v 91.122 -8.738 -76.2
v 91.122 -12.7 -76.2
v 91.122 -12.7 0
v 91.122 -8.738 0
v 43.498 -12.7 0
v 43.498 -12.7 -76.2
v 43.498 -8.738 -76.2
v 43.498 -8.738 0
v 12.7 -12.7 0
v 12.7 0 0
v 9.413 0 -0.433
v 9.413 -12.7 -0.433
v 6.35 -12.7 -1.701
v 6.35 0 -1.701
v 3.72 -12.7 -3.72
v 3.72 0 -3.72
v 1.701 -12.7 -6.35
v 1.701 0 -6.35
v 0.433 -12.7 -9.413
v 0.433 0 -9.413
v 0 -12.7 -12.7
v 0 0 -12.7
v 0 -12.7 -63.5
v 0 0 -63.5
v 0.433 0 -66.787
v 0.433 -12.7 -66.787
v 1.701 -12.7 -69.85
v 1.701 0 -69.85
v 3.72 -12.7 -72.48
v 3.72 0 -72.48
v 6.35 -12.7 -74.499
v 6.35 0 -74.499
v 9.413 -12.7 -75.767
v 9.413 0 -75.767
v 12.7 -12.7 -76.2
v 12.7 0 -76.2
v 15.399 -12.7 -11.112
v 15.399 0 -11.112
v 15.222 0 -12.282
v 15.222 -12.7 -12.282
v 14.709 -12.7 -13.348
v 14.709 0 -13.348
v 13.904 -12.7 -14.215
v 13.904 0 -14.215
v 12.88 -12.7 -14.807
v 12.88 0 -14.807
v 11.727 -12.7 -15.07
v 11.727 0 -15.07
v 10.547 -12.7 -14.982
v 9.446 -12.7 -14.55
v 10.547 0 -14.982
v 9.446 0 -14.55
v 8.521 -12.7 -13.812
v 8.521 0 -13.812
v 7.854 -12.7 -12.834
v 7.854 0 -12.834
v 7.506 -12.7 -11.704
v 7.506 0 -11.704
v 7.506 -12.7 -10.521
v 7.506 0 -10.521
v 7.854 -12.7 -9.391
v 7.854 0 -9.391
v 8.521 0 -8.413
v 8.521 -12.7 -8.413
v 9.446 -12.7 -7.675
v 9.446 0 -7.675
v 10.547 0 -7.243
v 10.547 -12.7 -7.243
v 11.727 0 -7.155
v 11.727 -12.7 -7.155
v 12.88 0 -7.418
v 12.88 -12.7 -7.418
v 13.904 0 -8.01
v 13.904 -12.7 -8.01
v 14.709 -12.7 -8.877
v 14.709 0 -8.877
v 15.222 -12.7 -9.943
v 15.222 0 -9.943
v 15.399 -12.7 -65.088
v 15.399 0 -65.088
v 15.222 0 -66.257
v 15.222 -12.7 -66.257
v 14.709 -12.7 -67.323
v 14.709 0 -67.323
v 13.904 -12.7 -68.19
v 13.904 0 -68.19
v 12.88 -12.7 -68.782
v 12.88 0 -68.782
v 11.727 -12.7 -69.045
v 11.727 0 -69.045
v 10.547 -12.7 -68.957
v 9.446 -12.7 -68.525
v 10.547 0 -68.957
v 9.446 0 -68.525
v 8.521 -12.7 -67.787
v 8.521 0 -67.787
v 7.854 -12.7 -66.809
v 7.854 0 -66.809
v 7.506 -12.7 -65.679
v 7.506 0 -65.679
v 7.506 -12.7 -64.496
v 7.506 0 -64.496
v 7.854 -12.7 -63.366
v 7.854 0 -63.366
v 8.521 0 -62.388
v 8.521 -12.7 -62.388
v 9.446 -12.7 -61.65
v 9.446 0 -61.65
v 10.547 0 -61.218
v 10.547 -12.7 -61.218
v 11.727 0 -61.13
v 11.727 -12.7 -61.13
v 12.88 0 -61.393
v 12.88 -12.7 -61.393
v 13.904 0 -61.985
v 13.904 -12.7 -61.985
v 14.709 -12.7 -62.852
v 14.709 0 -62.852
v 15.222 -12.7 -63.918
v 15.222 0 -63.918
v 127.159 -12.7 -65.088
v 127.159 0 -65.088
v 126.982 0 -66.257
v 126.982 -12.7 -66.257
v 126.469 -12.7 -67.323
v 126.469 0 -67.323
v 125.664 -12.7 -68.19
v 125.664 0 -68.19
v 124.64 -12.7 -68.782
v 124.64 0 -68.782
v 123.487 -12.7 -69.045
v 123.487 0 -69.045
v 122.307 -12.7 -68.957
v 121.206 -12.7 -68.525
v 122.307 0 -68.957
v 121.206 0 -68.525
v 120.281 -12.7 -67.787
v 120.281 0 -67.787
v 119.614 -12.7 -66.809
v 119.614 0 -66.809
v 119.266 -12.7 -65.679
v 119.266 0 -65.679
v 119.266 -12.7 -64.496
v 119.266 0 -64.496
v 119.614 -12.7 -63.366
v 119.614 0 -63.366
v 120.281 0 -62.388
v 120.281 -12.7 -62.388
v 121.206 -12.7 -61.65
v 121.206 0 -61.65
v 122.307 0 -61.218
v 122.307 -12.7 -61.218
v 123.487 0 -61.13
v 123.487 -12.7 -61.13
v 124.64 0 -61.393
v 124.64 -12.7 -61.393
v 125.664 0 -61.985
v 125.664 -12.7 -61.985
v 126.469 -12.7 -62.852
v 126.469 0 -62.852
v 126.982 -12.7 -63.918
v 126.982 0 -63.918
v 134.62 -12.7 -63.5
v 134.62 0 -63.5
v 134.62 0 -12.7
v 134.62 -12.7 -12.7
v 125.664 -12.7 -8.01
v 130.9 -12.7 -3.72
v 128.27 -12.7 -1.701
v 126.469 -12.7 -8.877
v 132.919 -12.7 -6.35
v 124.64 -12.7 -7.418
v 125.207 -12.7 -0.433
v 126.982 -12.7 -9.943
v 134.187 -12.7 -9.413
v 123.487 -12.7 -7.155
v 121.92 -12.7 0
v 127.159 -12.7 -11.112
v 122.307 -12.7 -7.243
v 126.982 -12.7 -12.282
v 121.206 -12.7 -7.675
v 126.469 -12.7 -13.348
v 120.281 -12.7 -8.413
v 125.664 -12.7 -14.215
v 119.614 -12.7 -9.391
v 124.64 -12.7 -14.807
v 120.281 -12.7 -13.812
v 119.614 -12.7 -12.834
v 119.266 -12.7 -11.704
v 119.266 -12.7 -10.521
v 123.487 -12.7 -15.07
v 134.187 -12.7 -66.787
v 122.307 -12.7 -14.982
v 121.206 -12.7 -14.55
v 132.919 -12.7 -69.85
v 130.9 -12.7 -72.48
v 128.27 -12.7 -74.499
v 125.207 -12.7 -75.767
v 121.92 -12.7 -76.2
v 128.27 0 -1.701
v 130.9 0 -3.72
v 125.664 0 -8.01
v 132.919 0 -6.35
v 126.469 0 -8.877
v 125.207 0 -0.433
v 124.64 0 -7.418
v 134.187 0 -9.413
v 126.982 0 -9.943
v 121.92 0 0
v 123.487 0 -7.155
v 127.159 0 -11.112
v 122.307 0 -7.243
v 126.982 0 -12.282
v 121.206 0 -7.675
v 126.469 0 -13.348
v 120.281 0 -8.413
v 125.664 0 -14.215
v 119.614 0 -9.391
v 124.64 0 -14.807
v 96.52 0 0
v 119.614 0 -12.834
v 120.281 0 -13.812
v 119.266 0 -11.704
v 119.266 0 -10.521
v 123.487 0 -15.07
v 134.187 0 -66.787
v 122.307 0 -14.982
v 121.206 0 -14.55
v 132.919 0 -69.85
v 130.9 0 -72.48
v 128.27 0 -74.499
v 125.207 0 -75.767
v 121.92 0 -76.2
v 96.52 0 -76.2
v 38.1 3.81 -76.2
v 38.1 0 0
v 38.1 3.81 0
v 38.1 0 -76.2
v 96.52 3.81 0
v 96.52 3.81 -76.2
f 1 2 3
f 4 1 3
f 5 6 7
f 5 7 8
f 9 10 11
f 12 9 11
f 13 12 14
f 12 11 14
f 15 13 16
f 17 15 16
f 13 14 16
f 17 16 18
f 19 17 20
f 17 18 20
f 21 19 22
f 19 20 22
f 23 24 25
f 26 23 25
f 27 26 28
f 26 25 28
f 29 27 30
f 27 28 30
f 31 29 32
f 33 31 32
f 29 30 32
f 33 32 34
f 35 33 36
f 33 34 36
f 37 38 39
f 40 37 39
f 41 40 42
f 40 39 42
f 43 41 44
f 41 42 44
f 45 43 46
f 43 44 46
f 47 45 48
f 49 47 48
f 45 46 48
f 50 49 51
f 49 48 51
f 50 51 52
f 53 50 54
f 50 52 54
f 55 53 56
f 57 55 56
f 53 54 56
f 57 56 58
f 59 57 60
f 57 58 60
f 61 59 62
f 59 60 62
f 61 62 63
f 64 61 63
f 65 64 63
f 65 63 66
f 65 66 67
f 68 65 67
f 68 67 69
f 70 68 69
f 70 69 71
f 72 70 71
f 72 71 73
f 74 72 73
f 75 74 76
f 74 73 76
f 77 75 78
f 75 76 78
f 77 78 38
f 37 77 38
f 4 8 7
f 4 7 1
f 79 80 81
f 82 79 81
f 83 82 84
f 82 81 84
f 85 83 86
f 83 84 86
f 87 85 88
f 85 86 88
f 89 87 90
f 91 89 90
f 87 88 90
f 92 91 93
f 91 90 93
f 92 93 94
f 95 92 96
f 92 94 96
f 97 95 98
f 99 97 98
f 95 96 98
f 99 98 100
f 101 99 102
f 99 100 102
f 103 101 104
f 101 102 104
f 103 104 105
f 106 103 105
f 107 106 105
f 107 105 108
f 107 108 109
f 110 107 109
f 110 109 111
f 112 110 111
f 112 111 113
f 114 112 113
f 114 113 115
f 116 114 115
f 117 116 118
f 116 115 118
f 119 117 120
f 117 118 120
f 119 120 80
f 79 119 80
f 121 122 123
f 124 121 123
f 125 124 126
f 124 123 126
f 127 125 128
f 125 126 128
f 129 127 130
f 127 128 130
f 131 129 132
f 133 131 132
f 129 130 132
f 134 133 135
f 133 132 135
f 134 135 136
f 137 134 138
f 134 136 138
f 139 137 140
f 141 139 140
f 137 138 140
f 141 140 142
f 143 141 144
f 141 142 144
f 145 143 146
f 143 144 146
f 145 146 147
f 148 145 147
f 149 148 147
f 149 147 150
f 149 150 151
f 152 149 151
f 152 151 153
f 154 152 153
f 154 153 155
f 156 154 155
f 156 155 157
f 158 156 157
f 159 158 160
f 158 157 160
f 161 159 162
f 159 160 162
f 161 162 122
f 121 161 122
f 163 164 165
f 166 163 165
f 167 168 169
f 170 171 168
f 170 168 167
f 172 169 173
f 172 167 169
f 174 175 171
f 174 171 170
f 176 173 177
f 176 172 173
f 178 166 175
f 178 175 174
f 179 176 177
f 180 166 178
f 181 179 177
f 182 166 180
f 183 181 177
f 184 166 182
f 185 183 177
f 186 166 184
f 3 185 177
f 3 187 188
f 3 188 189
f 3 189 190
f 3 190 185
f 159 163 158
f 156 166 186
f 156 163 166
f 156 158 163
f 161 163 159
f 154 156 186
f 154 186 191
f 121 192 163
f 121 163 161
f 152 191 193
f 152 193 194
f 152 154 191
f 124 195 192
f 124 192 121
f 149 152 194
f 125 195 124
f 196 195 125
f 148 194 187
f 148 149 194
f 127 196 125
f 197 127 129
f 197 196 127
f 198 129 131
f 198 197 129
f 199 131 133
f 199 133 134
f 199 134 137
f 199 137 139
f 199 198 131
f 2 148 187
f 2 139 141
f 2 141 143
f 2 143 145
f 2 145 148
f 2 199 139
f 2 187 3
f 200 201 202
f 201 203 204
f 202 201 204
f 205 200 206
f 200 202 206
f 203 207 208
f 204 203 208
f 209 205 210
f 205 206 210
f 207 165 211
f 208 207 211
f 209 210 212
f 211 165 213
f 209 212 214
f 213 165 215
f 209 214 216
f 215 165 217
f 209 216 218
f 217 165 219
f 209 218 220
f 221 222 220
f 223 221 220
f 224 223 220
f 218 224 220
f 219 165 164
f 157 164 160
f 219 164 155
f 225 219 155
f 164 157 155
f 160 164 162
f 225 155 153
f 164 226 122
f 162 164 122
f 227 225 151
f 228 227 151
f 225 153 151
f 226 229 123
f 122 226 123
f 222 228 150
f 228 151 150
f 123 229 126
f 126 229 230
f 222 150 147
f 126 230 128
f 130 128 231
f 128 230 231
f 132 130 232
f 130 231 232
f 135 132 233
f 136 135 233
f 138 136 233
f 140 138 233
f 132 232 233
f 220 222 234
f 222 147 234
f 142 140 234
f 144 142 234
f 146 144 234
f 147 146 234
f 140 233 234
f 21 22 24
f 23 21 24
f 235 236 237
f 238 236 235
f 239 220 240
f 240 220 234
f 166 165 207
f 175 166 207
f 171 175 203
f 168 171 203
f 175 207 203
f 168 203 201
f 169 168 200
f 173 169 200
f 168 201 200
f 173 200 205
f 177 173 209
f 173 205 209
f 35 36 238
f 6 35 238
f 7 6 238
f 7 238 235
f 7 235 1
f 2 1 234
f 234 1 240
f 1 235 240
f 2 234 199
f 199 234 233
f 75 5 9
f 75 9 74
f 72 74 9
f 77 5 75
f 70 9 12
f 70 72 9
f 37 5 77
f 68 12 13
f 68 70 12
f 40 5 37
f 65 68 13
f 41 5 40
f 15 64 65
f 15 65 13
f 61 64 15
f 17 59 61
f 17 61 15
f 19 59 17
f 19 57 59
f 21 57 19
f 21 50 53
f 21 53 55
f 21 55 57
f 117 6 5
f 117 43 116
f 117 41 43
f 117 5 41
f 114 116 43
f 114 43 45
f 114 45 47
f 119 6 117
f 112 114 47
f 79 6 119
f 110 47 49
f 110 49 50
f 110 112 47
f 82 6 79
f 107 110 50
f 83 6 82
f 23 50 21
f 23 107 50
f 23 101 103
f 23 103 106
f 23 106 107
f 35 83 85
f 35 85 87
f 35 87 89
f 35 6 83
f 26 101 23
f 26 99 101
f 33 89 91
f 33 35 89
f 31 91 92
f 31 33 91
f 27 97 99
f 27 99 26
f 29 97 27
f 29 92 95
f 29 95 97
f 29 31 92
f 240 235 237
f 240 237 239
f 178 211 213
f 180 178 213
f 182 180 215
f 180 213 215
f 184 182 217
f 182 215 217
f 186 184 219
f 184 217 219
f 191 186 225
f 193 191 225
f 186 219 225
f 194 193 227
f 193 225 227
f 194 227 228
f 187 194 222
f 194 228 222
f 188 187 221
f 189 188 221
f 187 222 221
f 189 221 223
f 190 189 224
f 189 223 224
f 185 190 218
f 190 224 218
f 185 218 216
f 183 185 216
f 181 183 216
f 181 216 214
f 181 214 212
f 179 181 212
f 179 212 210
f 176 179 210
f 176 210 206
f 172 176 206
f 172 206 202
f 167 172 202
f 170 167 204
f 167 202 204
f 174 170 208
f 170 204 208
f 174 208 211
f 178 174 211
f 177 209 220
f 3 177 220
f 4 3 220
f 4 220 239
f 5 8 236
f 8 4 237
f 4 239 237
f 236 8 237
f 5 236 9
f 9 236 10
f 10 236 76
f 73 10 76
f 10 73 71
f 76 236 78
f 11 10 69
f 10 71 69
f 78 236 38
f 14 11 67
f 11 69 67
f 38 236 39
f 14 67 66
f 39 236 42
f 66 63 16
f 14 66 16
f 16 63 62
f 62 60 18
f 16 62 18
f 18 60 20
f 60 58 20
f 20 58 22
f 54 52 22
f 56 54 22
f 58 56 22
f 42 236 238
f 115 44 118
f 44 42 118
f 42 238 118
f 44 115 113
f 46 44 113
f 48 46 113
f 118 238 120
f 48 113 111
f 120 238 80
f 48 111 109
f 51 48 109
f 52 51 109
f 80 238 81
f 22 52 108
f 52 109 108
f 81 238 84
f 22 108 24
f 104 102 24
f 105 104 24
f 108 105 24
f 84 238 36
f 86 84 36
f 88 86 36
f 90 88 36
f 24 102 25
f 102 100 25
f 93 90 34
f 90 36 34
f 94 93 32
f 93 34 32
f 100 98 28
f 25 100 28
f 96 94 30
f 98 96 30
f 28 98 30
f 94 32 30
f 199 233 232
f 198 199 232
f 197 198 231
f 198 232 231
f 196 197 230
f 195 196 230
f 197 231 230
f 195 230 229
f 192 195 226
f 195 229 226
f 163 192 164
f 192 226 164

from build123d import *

# Parameters (mm, degrees)
SKETCH1_R           = 3.96875
BOSS_EXTRUDE1_DEPTH = 12.7
SKETCH3_W           = 58.42
SKETCH3_H           = 76.2
BOSS_EXTRUDE2_DEPTH = 3.81
SKETCH4_W           = 47.625
SKETCH4_H           = 76.2
CUT_EXTRUDE1_DEPTH  = 3.9624


with BuildPart() as part:
    # Sketch1 → Boss-Extrude1 (new body)
    with BuildSketch(Plane(origin=(0, 0, 0), x_dir=(1, 0, 0), z_dir=(0, 1, 0))):
        with BuildLine():
            Line((12.7, 76.2), (121.92, 76.2))
            ThreePointArc((121.92, 76.2), (130.900256121, 72.480256121), (134.62, 63.5))
            Line((134.62, 63.5), (134.62, 12.7))
            ThreePointArc((134.62, 12.7), (130.900256121, 3.719743879), (121.92, 0))
            Line((121.92, 0), (12.7, 0))
            ThreePointArc((12.7, 0), (3.719743879, 3.719743879), (0, 12.7))
            Line((0, 12.7), (0, 63.5))
            ThreePointArc((0, 63.5), (3.719743879, 72.480256121), (12.7, 76.2))
        make_face()
        with Locations((11.43, 65.0875)):
            Circle(SKETCH1_R, mode=Mode.SUBTRACT)
        with Locations((123.19, 65.0875)):
            Circle(SKETCH1_R, mode=Mode.SUBTRACT)
        with Locations((123.19, 11.1125)):
            Circle(SKETCH1_R, mode=Mode.SUBTRACT)
        with Locations((11.43, 11.1125)):
            Circle(SKETCH1_R, mode=Mode.SUBTRACT)
    extrude(amount=-BOSS_EXTRUDE1_DEPTH)

    # Sketch3 → Boss-Extrude2 (add)
    with BuildSketch(Plane(origin=(0, 0, 0), x_dir=(1, 0, 0), z_dir=(0, 1, 0))):
        with Locations((67.31, 38.1)):
            Rectangle(SKETCH3_W, SKETCH3_H)
    extrude(amount=BOSS_EXTRUDE2_DEPTH)

    # Sketch4 → Cut-Extrude1 (cut)
    with BuildSketch(Plane.XZ.offset(12.7)):
        with Locations((67.31, -38.1)):
            Rectangle(SKETCH4_W, SKETCH4_H)
    extrude(amount=-CUT_EXTRUDE1_DEPTH, mode=Mode.SUBTRACT)


solid = part.part
